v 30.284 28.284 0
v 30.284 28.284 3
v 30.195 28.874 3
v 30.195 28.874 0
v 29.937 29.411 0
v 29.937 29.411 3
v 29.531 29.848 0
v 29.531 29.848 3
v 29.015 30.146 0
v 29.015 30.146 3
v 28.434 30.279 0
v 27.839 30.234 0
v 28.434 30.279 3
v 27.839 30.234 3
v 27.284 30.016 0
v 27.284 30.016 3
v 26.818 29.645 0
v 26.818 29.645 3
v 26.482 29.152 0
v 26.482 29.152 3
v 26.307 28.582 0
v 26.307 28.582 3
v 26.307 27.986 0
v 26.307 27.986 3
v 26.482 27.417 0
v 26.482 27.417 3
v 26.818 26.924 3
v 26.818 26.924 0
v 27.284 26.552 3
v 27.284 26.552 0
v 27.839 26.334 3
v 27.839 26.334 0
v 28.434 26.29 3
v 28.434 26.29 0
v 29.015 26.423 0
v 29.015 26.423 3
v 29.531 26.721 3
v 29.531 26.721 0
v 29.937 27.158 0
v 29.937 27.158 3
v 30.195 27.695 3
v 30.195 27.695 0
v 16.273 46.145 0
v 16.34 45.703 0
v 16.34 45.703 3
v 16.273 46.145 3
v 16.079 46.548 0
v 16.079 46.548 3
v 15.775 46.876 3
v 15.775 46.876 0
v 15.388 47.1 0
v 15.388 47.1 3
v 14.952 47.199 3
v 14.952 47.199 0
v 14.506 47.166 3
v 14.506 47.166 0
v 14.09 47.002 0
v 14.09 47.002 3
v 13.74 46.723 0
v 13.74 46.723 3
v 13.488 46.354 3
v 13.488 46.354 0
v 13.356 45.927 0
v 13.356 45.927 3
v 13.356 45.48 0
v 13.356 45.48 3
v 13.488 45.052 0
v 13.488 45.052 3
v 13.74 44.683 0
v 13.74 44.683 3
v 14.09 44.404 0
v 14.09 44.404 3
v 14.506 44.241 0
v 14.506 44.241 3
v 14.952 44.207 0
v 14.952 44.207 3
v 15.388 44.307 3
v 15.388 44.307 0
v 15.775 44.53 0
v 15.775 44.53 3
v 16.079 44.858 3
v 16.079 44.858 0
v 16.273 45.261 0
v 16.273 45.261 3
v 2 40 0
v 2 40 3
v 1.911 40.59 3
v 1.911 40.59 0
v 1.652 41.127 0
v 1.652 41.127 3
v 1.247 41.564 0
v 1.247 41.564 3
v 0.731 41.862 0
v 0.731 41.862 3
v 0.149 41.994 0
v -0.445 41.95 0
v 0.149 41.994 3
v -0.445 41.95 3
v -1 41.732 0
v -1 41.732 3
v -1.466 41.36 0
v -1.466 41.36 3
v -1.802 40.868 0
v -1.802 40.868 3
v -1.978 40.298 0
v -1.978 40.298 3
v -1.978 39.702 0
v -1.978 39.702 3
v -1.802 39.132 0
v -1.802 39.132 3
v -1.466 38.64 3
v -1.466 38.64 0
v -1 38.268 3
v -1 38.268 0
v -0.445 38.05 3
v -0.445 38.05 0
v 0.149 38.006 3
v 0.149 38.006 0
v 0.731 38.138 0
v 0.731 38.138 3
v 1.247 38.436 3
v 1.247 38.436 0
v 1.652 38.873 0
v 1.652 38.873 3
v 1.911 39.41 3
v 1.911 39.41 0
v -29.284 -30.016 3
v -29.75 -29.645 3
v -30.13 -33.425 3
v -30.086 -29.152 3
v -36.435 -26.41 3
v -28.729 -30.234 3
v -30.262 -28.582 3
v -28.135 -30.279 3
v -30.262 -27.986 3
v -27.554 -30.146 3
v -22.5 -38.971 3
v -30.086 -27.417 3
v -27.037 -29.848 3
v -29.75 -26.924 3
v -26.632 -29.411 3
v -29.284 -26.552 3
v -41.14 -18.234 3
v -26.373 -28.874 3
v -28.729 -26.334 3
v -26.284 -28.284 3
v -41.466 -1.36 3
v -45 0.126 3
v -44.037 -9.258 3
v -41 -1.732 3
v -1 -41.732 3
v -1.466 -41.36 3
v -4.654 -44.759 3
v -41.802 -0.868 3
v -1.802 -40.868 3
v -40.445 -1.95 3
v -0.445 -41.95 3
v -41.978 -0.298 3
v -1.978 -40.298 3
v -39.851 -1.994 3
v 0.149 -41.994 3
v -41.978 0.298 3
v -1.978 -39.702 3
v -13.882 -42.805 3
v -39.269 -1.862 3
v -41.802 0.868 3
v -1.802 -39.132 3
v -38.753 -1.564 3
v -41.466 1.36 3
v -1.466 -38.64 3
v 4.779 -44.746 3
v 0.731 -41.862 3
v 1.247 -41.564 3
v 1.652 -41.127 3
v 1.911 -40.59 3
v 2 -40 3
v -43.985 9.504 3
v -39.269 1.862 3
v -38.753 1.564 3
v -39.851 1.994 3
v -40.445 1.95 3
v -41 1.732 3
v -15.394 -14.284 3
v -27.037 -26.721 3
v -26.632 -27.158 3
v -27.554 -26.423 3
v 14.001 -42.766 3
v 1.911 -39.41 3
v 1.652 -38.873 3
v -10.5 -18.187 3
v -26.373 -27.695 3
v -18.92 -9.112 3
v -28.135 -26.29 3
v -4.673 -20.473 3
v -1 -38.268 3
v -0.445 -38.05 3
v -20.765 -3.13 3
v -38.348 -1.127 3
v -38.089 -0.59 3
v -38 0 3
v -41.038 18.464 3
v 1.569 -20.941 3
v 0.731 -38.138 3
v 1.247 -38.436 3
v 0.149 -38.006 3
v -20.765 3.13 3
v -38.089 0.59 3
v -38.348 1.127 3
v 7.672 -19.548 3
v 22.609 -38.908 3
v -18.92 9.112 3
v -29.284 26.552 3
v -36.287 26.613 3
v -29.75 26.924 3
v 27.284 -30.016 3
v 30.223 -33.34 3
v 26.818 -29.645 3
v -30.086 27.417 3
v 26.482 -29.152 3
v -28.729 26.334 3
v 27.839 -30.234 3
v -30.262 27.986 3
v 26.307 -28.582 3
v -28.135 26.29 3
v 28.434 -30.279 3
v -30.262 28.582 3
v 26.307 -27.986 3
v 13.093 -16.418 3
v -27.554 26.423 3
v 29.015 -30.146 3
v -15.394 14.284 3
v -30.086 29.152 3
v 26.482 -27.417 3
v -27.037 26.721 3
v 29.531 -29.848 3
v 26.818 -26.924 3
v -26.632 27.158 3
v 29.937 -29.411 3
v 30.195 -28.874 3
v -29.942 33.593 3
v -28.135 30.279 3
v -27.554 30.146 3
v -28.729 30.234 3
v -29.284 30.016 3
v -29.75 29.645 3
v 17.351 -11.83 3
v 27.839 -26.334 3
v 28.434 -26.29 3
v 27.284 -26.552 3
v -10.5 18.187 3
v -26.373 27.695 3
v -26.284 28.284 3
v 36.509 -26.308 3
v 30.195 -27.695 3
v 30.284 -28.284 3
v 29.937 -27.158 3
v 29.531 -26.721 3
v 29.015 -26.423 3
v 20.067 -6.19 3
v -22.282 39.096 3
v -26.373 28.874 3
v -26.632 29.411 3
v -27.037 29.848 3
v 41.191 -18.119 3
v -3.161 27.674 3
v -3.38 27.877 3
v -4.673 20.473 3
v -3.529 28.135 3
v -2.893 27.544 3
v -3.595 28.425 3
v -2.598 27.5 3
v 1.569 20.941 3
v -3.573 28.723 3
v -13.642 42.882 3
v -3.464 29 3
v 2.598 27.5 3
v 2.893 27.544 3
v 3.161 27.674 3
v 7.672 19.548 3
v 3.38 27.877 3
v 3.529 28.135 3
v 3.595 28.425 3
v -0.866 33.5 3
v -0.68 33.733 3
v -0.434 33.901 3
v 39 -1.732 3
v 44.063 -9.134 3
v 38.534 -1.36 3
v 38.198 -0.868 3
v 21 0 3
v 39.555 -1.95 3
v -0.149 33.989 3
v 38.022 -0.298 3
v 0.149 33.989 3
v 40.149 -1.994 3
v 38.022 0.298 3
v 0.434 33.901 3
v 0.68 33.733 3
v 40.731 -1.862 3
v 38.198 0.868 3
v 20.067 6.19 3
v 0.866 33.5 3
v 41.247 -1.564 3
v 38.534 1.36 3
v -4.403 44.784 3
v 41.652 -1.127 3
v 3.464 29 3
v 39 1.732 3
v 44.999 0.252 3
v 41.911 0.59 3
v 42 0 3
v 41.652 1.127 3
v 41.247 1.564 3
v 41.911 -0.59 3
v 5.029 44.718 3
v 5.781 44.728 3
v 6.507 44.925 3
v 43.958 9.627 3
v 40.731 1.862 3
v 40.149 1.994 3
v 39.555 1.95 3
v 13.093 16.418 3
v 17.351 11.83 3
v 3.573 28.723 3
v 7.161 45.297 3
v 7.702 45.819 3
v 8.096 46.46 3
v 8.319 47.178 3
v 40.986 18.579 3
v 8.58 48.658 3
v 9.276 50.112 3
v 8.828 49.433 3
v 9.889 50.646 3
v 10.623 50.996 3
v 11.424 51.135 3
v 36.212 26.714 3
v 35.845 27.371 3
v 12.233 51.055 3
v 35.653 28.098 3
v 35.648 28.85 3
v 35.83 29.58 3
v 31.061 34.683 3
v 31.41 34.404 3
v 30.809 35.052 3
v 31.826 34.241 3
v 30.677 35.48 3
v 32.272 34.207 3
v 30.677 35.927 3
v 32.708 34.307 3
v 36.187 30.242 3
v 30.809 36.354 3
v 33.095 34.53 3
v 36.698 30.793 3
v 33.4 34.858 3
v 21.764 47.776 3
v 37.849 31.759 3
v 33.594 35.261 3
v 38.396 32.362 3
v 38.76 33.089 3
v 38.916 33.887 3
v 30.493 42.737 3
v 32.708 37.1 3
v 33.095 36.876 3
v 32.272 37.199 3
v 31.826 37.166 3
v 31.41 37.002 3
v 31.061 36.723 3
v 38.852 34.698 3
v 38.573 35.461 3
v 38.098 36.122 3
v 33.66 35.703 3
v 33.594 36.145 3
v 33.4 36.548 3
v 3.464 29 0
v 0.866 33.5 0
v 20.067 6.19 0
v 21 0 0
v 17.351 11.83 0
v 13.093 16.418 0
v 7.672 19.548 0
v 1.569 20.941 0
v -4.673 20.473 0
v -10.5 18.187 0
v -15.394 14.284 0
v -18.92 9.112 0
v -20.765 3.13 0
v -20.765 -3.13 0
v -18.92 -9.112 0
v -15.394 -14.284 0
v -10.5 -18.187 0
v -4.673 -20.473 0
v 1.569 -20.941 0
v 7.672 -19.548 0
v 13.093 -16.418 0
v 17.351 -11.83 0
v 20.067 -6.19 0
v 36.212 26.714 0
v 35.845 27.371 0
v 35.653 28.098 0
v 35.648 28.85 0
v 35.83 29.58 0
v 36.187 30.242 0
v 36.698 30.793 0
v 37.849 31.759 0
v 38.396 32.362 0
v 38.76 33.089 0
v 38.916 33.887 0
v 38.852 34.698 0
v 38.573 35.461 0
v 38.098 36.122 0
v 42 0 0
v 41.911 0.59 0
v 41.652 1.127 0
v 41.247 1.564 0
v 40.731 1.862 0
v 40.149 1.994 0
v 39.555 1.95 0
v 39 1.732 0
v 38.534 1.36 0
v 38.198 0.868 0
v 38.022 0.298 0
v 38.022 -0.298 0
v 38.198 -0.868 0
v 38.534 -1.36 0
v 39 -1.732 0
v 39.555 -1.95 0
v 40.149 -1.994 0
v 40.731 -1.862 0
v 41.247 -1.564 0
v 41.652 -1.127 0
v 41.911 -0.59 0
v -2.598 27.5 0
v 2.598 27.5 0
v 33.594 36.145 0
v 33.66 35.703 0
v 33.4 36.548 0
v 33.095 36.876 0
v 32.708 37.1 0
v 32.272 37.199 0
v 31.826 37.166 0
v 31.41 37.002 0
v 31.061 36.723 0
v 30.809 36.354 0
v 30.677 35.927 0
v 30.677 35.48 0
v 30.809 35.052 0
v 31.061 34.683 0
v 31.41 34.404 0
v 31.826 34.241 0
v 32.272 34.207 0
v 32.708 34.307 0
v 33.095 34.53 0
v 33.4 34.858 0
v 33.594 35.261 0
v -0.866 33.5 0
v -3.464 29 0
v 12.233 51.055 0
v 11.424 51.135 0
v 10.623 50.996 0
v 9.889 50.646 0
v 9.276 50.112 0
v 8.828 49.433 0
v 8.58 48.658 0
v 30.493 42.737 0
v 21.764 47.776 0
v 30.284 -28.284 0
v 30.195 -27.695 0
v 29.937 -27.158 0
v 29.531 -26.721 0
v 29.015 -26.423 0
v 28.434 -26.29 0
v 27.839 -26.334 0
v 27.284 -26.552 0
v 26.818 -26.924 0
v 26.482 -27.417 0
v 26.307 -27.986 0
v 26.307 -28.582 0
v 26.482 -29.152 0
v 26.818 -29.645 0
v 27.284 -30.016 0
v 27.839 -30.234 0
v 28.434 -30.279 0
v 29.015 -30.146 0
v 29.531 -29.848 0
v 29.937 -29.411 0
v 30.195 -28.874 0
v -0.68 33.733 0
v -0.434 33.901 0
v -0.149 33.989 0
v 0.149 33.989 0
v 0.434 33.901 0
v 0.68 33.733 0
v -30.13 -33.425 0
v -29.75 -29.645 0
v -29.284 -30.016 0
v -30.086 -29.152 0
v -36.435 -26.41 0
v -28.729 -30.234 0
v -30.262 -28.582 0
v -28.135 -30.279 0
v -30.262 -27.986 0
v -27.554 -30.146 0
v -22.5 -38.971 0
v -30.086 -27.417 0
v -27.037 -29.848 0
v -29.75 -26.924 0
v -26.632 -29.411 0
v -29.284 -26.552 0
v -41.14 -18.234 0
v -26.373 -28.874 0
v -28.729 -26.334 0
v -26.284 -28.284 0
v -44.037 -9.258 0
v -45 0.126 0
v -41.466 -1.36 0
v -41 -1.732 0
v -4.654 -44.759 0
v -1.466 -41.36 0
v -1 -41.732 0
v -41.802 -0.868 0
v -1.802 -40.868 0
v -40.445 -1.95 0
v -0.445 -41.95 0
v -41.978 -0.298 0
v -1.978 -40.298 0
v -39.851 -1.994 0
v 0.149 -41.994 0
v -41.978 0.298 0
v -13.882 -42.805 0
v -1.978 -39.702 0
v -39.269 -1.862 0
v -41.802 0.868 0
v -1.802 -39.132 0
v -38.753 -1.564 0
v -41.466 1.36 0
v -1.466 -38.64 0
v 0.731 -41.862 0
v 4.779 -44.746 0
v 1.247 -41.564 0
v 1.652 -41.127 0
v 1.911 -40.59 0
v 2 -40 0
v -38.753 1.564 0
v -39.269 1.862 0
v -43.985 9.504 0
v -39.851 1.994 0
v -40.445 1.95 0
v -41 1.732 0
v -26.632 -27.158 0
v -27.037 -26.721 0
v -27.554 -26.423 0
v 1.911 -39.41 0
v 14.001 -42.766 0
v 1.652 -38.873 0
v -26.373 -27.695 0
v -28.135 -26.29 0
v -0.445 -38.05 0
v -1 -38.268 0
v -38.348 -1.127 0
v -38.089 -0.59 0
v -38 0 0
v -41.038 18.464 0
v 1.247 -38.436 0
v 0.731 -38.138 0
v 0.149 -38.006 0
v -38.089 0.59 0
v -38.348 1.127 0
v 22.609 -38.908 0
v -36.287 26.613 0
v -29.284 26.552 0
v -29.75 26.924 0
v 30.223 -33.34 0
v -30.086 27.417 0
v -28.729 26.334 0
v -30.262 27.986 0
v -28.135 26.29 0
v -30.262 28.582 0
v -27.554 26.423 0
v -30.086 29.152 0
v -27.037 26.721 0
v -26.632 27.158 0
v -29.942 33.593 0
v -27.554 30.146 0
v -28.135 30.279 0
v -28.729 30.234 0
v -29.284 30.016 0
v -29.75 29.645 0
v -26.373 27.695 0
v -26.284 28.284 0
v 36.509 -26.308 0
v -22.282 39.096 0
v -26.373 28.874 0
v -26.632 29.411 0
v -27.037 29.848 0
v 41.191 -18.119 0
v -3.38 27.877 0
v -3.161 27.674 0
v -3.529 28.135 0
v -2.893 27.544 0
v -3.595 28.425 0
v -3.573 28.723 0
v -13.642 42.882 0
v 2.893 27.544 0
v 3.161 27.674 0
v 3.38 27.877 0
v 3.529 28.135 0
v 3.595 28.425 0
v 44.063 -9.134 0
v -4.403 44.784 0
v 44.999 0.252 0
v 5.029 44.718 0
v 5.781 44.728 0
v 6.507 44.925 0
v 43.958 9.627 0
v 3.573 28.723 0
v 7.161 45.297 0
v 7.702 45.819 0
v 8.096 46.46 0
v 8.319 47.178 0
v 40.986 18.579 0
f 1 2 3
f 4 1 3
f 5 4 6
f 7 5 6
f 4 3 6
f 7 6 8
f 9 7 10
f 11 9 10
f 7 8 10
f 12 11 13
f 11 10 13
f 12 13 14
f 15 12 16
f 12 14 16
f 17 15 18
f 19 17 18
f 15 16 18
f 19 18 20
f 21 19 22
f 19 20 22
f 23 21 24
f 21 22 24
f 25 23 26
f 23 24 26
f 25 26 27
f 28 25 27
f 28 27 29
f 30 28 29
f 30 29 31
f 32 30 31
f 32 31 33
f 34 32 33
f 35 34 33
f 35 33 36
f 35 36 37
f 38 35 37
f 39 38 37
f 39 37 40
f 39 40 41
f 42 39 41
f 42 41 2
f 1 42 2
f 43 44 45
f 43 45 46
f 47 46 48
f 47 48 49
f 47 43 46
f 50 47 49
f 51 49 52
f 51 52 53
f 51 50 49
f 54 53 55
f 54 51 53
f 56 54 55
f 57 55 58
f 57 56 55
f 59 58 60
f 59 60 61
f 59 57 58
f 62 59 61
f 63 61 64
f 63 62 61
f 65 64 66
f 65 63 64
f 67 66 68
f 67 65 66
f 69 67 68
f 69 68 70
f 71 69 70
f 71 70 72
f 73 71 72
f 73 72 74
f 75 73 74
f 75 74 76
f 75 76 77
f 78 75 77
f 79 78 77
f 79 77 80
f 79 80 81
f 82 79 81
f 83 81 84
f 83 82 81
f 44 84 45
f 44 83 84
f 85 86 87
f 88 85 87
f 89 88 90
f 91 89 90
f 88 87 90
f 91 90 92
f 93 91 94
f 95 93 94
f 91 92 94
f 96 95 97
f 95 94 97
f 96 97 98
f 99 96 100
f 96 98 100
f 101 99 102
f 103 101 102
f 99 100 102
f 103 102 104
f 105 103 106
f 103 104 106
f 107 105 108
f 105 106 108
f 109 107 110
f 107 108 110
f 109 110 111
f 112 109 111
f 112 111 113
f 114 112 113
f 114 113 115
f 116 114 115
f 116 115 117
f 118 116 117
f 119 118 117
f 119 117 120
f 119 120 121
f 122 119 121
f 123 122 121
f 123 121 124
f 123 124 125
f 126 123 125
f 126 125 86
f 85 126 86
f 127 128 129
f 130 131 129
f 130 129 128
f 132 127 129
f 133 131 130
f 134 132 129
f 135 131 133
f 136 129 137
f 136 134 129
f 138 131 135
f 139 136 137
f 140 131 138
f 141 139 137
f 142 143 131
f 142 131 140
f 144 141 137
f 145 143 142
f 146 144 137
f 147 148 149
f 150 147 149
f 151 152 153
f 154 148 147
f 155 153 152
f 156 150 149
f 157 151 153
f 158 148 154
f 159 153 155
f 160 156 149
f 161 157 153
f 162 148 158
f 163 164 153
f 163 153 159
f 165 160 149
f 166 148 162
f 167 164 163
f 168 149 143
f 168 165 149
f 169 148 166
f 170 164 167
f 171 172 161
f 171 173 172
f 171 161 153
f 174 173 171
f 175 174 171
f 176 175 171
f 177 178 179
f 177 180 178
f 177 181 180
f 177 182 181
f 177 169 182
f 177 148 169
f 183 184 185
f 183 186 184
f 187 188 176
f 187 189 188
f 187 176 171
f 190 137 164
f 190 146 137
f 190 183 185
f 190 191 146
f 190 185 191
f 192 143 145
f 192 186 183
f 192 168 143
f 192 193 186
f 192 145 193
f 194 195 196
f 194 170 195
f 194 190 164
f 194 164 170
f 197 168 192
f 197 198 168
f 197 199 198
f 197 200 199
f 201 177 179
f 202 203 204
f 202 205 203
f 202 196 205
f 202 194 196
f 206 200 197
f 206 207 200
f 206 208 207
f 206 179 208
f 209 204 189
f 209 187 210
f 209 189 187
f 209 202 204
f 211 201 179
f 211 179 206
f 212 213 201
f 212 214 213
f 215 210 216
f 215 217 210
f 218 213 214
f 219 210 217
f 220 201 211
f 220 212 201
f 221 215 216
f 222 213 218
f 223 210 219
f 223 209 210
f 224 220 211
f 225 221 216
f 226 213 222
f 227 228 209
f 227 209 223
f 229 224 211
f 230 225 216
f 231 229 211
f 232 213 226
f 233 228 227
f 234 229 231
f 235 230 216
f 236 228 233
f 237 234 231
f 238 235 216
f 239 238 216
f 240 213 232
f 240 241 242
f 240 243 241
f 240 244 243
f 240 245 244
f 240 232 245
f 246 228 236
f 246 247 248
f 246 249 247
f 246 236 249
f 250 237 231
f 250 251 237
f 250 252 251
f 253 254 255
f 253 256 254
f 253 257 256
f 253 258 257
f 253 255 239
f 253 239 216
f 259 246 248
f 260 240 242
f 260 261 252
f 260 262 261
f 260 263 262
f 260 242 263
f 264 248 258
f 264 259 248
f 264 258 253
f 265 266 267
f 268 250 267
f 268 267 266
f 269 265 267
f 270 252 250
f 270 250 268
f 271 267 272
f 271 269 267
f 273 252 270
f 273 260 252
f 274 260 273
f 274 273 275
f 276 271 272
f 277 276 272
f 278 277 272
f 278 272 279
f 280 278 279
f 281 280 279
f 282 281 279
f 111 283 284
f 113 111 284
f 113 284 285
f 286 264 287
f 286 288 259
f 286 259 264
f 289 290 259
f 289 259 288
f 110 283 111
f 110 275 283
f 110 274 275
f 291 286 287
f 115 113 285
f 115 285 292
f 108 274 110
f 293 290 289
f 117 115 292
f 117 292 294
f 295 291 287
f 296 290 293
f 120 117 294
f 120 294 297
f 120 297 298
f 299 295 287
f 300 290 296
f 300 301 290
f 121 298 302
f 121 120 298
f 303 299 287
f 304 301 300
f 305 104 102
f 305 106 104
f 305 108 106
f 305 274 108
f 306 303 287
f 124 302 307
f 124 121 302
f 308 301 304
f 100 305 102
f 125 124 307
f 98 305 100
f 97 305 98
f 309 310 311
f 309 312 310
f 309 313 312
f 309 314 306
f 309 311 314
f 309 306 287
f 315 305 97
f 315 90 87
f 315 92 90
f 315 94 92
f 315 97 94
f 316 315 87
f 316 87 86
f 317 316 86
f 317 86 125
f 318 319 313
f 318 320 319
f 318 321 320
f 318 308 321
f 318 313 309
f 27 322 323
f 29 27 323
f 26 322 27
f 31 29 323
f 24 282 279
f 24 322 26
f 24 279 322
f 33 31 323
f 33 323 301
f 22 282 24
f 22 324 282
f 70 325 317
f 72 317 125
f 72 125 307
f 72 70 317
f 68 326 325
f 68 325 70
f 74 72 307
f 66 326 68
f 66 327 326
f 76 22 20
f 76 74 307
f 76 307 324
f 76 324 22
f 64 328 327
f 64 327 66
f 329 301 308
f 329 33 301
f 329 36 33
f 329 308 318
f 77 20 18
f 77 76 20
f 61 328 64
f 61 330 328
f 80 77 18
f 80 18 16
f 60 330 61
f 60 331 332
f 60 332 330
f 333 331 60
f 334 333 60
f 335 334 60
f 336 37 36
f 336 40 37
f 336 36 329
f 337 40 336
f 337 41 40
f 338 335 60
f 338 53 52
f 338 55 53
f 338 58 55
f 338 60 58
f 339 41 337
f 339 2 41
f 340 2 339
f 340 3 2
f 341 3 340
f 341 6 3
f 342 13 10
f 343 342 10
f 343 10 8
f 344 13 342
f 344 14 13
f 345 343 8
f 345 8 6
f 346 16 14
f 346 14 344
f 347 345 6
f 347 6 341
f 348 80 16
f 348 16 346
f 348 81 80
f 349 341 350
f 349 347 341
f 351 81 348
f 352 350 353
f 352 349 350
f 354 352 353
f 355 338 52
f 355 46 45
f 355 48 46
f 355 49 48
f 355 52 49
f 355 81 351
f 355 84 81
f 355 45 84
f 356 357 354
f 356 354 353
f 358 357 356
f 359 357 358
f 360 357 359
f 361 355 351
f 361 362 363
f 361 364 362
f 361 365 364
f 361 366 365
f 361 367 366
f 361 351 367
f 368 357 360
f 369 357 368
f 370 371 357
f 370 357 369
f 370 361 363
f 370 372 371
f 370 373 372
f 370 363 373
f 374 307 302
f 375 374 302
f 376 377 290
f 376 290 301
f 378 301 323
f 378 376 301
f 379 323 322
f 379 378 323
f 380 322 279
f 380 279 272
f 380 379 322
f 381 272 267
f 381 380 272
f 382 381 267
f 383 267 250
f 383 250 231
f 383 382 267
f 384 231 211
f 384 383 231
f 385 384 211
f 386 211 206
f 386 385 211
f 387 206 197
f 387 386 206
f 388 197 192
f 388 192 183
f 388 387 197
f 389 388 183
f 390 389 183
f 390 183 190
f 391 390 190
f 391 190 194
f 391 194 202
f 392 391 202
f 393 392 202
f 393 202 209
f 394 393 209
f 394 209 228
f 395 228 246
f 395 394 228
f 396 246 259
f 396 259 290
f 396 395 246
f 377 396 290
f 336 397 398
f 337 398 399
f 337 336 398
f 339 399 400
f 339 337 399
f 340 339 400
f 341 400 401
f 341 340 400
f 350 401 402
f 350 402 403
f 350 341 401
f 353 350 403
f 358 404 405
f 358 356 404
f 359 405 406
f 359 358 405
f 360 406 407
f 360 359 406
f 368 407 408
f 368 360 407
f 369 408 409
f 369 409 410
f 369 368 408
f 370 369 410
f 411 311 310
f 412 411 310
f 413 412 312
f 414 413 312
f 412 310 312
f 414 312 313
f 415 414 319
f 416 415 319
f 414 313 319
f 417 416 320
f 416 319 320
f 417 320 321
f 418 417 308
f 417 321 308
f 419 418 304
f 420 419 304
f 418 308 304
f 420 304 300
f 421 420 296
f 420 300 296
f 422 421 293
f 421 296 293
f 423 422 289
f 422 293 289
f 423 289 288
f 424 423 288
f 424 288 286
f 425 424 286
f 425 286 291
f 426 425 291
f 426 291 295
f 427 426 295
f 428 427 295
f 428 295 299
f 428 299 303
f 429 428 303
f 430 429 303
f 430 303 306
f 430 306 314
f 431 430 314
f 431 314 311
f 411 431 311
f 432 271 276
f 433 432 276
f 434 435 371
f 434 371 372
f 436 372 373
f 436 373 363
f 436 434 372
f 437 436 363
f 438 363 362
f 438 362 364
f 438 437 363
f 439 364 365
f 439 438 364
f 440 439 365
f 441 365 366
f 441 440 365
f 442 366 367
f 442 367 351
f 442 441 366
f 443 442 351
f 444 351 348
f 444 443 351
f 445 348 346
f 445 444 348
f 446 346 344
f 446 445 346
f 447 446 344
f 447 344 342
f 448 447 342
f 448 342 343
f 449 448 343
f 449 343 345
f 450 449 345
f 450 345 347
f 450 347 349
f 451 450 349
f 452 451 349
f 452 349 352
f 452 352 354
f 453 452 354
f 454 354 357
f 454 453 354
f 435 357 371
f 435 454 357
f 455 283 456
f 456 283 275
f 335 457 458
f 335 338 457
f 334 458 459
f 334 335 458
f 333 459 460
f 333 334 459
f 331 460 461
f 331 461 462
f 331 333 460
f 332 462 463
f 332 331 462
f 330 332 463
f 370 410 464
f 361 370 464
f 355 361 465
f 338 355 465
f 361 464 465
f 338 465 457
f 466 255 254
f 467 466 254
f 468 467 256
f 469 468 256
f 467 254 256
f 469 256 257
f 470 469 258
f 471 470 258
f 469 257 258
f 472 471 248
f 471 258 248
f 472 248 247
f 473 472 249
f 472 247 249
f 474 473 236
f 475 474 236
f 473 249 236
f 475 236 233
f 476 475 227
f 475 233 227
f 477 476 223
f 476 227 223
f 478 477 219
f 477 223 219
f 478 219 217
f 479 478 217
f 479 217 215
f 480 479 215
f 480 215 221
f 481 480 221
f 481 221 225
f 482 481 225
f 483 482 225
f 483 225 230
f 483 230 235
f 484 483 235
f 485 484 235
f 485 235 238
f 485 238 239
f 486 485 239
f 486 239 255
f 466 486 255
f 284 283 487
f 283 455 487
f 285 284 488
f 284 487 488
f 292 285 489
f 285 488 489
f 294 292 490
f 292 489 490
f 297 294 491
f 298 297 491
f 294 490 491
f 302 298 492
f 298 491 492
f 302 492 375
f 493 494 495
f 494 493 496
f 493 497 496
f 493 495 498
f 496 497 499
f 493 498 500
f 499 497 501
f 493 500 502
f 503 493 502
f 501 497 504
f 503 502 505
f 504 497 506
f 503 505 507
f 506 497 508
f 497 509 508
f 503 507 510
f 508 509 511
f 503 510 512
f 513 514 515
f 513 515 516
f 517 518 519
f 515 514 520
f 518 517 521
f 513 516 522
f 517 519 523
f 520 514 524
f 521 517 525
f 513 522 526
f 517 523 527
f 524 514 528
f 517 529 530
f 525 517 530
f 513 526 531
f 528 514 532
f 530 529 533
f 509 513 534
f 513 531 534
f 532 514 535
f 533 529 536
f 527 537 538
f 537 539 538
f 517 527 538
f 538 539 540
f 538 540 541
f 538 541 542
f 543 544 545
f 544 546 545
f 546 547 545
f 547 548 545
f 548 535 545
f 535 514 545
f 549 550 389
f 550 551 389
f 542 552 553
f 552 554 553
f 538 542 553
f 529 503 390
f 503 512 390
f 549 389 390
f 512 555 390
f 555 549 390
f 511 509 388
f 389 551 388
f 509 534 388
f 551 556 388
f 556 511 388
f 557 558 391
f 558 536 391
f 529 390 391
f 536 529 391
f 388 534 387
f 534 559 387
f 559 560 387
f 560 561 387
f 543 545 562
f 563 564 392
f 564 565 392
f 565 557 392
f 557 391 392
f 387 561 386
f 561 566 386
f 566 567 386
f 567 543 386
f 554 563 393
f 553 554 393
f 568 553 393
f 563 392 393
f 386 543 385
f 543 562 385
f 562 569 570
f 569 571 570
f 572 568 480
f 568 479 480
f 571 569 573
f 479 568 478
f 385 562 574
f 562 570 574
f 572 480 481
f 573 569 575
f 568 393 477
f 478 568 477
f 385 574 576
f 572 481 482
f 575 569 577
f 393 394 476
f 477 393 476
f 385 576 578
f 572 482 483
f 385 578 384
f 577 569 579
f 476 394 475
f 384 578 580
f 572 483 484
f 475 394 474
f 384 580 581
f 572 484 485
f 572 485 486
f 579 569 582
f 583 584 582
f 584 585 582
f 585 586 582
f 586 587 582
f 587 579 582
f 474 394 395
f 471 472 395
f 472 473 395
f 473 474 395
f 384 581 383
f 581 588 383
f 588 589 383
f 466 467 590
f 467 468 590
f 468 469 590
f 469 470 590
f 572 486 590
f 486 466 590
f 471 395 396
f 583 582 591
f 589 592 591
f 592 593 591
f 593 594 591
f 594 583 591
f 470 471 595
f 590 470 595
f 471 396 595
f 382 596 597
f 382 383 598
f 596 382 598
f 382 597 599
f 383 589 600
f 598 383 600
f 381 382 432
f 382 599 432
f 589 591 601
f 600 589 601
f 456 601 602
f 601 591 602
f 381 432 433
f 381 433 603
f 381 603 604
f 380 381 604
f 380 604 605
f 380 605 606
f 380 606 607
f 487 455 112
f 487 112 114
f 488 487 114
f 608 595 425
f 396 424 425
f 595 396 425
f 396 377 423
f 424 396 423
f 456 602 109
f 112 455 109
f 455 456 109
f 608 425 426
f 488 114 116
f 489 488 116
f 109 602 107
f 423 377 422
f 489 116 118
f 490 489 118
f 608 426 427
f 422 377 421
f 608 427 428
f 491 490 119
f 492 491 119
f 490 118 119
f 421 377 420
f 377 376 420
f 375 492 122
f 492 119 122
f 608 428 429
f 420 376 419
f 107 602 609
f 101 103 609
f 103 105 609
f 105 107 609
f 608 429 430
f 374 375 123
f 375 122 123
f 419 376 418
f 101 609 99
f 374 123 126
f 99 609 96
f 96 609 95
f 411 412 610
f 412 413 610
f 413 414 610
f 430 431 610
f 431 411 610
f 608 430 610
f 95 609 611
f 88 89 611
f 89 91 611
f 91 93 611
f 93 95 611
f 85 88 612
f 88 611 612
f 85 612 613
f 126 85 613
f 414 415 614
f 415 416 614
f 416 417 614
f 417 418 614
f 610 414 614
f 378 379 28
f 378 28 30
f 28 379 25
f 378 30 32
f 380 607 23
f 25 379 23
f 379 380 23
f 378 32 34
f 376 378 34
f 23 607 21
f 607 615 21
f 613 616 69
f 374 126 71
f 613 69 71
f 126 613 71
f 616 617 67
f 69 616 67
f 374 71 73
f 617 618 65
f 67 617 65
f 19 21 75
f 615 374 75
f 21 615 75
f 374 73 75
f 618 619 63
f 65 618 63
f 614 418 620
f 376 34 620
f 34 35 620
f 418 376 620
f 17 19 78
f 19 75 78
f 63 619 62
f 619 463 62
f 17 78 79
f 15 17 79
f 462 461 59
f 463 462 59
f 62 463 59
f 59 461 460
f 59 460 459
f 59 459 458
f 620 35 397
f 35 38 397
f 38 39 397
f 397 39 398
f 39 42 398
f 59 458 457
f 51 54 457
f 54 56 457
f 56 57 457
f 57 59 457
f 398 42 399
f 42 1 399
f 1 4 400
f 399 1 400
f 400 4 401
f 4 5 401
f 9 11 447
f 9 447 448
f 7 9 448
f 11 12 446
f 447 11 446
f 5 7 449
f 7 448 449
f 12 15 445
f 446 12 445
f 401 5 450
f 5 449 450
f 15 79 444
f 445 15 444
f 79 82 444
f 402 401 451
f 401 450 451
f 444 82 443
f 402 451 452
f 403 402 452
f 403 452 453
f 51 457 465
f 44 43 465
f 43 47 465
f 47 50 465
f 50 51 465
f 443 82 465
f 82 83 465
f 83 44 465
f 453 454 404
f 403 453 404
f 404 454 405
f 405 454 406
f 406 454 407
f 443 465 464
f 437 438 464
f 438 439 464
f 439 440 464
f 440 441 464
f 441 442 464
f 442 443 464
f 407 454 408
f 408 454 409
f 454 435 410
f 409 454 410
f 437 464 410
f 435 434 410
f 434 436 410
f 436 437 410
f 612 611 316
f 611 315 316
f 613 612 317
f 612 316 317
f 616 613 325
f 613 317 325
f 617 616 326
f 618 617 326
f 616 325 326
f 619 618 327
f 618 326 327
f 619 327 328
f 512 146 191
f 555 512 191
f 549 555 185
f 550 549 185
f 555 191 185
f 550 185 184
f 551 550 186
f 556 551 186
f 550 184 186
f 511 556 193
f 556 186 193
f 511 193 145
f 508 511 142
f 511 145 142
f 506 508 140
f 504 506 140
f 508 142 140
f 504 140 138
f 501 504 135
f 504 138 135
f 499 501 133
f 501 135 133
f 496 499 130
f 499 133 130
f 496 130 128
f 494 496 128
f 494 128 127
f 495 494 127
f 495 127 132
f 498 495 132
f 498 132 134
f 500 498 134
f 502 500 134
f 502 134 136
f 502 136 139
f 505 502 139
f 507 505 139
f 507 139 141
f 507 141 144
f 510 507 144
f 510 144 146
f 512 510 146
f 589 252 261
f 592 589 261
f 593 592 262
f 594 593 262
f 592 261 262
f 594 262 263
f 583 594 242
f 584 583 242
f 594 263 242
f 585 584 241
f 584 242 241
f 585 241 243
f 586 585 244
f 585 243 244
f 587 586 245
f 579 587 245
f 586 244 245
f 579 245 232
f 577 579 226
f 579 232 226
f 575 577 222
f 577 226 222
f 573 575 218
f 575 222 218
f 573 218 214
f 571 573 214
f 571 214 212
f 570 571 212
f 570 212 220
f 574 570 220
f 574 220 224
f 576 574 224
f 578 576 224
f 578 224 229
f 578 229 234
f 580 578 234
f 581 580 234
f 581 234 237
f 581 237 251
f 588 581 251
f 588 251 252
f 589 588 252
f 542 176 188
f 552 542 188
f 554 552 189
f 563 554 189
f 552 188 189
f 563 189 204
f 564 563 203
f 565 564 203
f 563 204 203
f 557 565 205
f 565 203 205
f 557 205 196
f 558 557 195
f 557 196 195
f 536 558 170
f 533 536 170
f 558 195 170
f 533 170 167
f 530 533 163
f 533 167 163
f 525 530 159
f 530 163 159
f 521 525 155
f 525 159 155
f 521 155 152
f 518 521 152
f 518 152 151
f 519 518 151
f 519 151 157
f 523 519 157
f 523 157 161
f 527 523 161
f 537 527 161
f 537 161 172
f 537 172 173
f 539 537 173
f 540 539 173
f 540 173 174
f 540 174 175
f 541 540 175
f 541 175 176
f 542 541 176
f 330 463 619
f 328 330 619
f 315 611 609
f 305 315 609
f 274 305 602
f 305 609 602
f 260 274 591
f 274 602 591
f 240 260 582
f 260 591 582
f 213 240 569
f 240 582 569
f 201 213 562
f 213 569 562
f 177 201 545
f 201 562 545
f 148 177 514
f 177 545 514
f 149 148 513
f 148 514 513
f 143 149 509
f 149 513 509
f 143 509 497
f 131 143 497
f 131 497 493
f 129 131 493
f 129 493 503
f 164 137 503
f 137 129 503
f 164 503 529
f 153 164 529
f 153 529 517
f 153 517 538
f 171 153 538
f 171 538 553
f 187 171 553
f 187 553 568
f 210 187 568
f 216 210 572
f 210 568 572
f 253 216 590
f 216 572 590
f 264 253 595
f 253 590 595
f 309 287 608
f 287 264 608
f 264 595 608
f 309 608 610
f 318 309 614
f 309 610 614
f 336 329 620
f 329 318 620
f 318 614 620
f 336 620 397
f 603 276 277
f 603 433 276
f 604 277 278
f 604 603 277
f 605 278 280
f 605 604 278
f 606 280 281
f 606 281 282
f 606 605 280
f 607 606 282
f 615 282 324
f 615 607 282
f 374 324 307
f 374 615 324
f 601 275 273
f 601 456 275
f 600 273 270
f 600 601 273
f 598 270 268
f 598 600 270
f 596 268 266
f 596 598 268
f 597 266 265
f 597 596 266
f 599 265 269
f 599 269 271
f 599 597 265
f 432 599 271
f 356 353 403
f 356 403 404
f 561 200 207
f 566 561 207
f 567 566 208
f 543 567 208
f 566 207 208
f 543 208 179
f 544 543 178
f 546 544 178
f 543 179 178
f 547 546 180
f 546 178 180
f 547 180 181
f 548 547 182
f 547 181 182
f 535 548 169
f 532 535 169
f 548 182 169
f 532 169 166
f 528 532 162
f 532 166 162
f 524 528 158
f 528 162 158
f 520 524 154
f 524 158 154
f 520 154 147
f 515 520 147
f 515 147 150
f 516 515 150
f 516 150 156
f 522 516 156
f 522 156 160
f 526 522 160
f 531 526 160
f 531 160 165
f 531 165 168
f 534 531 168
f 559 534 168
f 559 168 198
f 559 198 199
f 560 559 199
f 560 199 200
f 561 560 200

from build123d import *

# Parameters (mm, degrees)
SKETCH_1_R          = 45
SKETCH_1_R_2        = 21
EXTRUDE_1_DEPTH     = 3
SKETCH_2_R          = 2
CUT_EXTRUDE_1_DEPTH = 10
CUT_EXTRUDE_2_DEPTH = 3
EXTRUDE_START       = -3
SKETCH_3_R          = 1.5
EXTRUDE_3_DEPTH     = 3
FILLET_2_R          = 1
FILLET_3_R          = 3


with BuildPart() as part:
    # 草图1 → 凸台-拉伸1 (new body)
    with BuildSketch(Plane.XY):
        Circle(SKETCH_1_R)
        Circle(SKETCH_1_R_2, mode=Mode.SUBTRACT)
    extrude(amount=EXTRUDE_1_DEPTH)

    # 草图2 → 切除-拉伸1 (cut)
    with BuildSketch(Plane.XY.offset(3)):
        with Locations((0, 40)):
            Circle(SKETCH_2_R)
        with Locations((28.284271247, 28.284271247)):
            Circle(SKETCH_2_R)
        with Locations((40, 0)):
            Circle(SKETCH_2_R)
        with Locations((28.284271247, -28.284271247)):
            Circle(SKETCH_2_R)
        with Locations((0, -40)):
            Circle(SKETCH_2_R)
        with Locations((-28.284271247, -28.284271247)):
            Circle(SKETCH_2_R)
        with Locations((-40, 0)):
            Circle(SKETCH_2_R)
        with Locations((-28.284271247, 28.284271247)):
            Circle(SKETCH_2_R)
    extrude(amount=-CUT_EXTRUDE_1_DEPTH, mode=Mode.SUBTRACT)

    # 草图4 → 切除-拉伸2 (cut)
    with BuildSketch(Plane.XY.offset(3)):
        Polygon((4.330127019, 27.5), (0, 35), (-4.330127019, 27.5), align=None)
    extrude(amount=-CUT_EXTRUDE_2_DEPTH, mode=Mode.SUBTRACT)

    # 草图3 → 凸台-拉伸3 (add)
    with BuildSketch(Plane.XY.offset(3).offset(EXTRUDE_START)):
        with BuildLine():
            Line((9.116529328, 51.702407033), (7.814167995, 44.316348886))
            ThreePointArc((7.814167995, 44.316348886), (22.5, 38.97114317), (34.47199994, 28.925442436))
            Line((34.47199994, 28.925442436), (40.217333264, 33.746349509))
            ThreePointArc((40.217333264, 33.746349509), (26.25, 45.466333699), (9.116529328, 51.702407033))
        make_face()
        with Locations((32.160254038, 35.703193978)):
            Circle(SKETCH_3_R, mode=Mode.SUBTRACT)
        with Locations((14.839745962, 45.703193978)):
            Circle(SKETCH_3_R, mode=Mode.SUBTRACT)
    extrude(amount=EXTRUDE_3_DEPTH)

    # 圆角2
    fillet_2_edges = [part.edges().sort_by_distance(p)[0] for p in [
        (4.330127019, 27.5, 1.5),
        (-4.330127019, 27.5, 1.5),
        (0, 35, 1.5),
    ]]
    fillet(fillet_2_edges, radius=FILLET_2_R)

    # 圆角3
    fillet_3_edges = [part.edges().sort_by_distance(p)[0] for p in [
        (40.217333264, 33.746349509, 1.5),
        (34.47199994, 28.925442436, 1.5),
        (7.814167995, 44.316348886, 1.5),
        (9.116529328, 51.702407033, 1.5),
    ]]
    fillet(fillet_3_edges, radius=FILLET_3_R)


solid = part.part
